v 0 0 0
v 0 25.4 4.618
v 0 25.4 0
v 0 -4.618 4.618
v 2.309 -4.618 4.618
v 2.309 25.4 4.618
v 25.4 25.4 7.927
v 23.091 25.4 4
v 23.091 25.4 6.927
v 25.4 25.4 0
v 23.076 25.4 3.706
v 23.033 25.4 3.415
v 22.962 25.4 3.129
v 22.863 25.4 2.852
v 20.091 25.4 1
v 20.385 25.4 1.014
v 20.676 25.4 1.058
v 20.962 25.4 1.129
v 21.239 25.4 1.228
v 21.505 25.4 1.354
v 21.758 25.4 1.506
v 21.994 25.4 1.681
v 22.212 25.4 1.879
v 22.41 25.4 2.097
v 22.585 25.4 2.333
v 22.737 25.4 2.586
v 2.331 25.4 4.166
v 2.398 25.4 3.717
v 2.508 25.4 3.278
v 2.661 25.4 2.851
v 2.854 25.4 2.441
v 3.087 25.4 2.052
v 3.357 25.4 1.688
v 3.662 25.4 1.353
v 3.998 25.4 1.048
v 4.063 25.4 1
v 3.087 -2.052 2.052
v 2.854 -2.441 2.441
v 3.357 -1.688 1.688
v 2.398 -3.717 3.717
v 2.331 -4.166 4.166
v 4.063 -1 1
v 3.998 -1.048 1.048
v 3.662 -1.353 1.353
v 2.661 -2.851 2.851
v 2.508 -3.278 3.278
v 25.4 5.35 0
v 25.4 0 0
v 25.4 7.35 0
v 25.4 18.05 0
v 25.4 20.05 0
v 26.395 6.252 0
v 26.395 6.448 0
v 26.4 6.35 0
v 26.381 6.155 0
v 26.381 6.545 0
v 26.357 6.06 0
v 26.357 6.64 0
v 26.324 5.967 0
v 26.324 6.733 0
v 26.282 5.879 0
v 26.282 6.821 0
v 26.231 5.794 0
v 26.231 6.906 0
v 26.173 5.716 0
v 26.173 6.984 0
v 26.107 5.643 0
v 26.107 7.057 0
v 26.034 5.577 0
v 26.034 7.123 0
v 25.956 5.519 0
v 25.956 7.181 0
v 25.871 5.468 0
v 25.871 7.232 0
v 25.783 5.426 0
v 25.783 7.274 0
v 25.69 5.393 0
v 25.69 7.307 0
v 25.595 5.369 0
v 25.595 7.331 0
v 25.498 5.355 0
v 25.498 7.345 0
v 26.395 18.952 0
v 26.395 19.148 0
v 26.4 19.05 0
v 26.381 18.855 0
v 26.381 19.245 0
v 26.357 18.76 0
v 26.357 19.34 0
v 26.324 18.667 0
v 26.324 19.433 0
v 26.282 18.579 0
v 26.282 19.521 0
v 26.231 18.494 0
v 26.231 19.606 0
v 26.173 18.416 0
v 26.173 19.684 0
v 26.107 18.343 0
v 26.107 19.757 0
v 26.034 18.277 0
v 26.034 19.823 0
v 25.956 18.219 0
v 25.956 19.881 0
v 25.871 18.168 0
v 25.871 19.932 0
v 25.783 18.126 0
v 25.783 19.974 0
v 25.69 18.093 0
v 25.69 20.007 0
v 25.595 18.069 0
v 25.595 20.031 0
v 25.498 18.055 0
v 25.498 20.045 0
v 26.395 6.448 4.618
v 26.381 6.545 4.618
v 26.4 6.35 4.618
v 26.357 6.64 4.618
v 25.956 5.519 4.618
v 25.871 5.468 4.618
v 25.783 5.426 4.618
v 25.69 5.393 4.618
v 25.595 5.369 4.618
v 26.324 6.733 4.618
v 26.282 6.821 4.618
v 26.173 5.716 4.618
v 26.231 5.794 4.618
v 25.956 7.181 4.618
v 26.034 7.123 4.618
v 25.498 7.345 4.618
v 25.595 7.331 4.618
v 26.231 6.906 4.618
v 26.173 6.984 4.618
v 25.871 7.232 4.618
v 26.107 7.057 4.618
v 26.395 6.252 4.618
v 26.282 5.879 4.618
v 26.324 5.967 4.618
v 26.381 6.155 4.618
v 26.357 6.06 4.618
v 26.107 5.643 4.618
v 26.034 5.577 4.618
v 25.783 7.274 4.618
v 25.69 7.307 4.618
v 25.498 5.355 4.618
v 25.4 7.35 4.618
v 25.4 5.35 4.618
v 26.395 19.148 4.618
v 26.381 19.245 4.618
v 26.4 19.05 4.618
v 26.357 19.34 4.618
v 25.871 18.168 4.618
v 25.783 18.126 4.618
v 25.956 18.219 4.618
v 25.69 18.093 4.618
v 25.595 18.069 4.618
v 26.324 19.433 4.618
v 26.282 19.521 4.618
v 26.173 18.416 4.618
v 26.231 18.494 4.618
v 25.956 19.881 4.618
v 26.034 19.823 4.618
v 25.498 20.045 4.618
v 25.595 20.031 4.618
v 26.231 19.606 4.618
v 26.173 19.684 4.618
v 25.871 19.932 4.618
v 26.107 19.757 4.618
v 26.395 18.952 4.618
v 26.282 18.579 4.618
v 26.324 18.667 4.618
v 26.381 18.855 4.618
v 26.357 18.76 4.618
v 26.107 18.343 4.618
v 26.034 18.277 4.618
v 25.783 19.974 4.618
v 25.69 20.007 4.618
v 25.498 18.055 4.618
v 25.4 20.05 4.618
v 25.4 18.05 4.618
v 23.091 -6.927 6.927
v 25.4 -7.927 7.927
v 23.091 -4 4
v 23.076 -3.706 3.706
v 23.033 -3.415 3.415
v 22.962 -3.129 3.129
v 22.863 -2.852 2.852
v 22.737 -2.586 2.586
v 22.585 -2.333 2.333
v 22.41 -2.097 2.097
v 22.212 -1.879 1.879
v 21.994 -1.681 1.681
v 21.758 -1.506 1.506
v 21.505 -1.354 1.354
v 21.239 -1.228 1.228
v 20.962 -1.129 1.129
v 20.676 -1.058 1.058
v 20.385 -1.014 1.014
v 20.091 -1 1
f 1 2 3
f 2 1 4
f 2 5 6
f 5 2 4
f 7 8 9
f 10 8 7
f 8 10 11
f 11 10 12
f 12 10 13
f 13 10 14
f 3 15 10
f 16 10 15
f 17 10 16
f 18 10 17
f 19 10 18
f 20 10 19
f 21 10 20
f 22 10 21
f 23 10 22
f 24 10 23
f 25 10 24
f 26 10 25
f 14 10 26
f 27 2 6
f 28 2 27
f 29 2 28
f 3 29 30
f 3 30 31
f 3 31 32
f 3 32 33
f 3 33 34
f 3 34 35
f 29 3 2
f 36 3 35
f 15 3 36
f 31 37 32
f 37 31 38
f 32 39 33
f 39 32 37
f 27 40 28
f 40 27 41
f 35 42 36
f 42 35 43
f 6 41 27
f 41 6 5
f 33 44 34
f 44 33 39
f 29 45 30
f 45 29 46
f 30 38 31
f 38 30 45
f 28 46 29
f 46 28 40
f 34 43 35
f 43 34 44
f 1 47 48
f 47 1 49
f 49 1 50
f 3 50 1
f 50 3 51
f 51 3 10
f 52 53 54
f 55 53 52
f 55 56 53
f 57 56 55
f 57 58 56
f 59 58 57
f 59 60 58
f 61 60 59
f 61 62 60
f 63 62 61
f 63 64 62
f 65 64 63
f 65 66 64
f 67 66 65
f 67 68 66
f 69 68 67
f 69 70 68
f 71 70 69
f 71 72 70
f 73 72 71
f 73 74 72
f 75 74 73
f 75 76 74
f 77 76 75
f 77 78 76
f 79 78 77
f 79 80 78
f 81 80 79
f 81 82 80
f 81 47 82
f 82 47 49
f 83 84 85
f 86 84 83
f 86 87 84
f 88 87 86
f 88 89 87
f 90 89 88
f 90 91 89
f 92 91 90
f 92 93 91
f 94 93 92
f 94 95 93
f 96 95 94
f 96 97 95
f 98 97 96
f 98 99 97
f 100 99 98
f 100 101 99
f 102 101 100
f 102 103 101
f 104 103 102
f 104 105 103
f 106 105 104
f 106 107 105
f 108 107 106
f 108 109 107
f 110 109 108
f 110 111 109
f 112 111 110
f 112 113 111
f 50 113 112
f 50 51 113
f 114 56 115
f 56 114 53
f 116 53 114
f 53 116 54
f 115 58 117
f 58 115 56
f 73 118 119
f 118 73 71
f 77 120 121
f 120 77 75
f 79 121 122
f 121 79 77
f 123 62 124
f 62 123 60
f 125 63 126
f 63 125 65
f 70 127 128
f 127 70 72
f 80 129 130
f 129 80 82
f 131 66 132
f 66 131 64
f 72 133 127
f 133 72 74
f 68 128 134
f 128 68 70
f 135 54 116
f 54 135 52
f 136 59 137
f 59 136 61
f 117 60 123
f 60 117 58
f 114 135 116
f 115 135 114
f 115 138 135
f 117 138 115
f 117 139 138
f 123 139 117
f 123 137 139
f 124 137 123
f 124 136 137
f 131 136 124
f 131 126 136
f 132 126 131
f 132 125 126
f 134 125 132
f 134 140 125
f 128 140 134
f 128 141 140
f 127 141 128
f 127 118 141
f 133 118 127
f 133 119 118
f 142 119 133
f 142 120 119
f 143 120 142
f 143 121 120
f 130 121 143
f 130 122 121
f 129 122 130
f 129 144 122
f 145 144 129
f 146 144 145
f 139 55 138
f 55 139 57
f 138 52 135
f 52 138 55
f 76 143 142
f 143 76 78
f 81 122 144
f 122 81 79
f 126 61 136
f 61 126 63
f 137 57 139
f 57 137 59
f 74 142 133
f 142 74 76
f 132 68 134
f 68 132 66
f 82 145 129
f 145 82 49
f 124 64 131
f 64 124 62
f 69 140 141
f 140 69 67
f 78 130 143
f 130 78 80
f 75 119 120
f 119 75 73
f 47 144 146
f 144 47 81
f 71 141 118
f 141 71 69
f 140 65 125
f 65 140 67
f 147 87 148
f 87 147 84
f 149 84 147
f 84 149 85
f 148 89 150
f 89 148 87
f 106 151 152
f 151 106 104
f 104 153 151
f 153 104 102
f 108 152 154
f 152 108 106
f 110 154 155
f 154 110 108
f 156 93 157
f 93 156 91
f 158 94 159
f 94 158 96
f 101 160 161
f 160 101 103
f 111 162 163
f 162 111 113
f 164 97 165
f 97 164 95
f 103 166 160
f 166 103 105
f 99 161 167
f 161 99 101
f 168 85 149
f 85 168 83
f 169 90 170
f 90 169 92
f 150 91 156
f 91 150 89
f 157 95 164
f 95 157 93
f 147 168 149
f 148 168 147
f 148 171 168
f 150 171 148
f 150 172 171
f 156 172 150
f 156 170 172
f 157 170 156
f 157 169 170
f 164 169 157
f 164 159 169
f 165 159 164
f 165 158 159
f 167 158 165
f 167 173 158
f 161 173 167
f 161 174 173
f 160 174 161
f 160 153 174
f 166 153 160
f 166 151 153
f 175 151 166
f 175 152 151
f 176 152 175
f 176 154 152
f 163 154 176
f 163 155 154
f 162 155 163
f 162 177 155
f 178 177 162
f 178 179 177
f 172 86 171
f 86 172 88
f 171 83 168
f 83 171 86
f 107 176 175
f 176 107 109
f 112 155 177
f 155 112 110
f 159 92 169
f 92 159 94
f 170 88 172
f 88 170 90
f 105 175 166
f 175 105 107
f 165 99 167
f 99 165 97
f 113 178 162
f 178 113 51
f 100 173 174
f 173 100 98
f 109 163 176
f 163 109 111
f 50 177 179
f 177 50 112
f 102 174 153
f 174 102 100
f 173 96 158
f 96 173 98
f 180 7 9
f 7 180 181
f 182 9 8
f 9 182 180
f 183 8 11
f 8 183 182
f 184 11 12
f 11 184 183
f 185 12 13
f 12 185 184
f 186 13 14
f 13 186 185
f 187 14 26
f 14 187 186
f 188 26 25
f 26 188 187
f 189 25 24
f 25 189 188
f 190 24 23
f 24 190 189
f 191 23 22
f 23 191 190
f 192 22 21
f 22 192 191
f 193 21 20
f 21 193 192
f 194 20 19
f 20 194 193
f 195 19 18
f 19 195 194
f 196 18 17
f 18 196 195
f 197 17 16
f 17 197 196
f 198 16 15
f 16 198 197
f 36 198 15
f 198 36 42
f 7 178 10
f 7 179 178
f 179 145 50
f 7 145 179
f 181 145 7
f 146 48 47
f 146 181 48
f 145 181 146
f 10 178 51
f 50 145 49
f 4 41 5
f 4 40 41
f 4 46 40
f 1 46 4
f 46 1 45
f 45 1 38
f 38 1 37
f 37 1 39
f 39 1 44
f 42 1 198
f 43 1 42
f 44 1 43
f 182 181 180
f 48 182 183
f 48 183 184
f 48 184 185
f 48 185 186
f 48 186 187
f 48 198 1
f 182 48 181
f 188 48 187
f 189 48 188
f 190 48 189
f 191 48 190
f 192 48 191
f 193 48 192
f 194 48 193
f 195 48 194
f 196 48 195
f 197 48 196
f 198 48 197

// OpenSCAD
// file: constants.scad
inchRatio = 25.4;
nozzelThickness = 0.4;
subUnitSide = 6 * inchRatio;


unitHeight = 1 * inchRatio;
// stepHeight = unitHeight / 12;
stepHeight = unitHeight / 11;
stepTred = (2 * unitHeight) / 11;

$fn = $preview ? 32 : 64;


capHeight = 2 * stepHeight;
capWidth = 4 * nozzelThickness;
taperHeight = .75;
taperWidth = stepTred;

default_wall = 2;


// how thick to make the continuous flat surface of the wall
facadeThickness = 1;
capEdgeDepth = stepTred * 1.5;
// main file
include<constants.scad>


// footer factory
// for (a =[1:5]) {
//     translate([10 * a, 0,0]) 
//     footerRun(a);
// }



// test


// testBase();

// translate([0,0,unitHeight]){
// capInnerRadius();

// translate([unitHeight-capWidth,-capWidth,0]) 
// rotate(a = 90) 
// capInterfaceCorner();

// translate([-capWidth,unitHeight-capWidth,0])
// rotate(a = 180)
// mirror([1,0,0])
// capInterfaceCorner();
// }

// translate([unitHeight,0,0]) 



// flatWall(1);
flatWallCorner();
// flatCap(3);

module flatWallCorner() {
    difference() {

    translate([0,-inchRatio,0]) flatWall(2);

    translate([-2,0,0])
    mirror([0,1,0])
    rotate([90,0,90])
    linear_extrude(inchRatio + 4)
        polygon(
            [
                [0,0],
                [10,10],
                [50,10],
                [50,0],
            ]
        );

    }

}

module flatWall(units = 2) {
    flatWallSection(units);
}

module flatWallBisection(units=2) {
    translate([unitHeight/2,units * inchRatio,facadeThickness])
    rotate([90,0,0]) {
    linear_extrude(units*inchRatio) {
        polygon([[0,0],[facadeThickness,0],[facadeThickness/2,-facadeThickness/4]]);
    }
    }
}

// front pitch = stepHeight by 1






module flatCap(units=2) {
    
    difference() {
    translate([0,units * inchRatio,0]){
        rotate([90,0,0]){
            linear_extrude(units * inchRatio) {
                polygon([
                [0,-3],
                [0,capEdgeDepth + 1],
                [stepHeight * 2, ,capEdgeDepth + 3],
                [stepHeight * 2, ,capEdgeDepth + 2],
                [1.5 ,capEdgeDepth],
                [1.5, -2.5],
            ]);
            }
        }
    }

    capAlignmnetArray(units, xOffset=0, zOffset = -0.1) {
        capAlignmentFemale();
    }
}
}
           



// units = number of inches 
module flatWallSection(units=2) {

    translate([0,units * inchRatio,0])
        rotate([90,0,0])
            linear_extrude(units * inchRatio) {
                fillet(3) 
                polygon([
                    [0,0],
                    [0,facadeThickness],
                    [unitHeight - stepHeight,facadeThickness],
                    [unitHeight - stepHeight,capEdgeDepth],
                    [unitHeight, capEdgeDepth + 1],
                    [unitHeight,0]
                ]);

            }

    layFlatFooter(units);

    capAlignmnetArray(units) {
        capAlignmentMale();
    }

}


module capAlignmentMale() {
    cylinder(r = 1, h=stepTred);
}

module capAlignmentFemale() {
    cylinder(r = 1.2, h=stepTred + 0.2);
}


module layFlatFooter(units = 2) {
    translate([0,0,stepTred]) {
        rotate([0,90,0]) {
            footerRun(units);
        }
    }
}



module fillet(r) {
   offset(r = -r) {
     offset(delta = r) {
       children();
     }
   }
}

module capAlignmnetArray(units = 2, xOffset=unitHeight, zOffset = 0) {

    startingOffset = inchRatio * 0.25;
    incrementalOffset = inchRatio * 0.5;
    numberOfBits = units * 2;
    
    for(i = [1 : 1 : numberOfBits]) {
        offset = startingOffset + (i - 1) * incrementalOffset;
        translate([xOffset,offset,zOffset])
        children();
    }

}






















module testBase() {
//    translate([capWidth,capWidth,0]) 
    difference() {
    cube ([2*unitHeight, 2*unitHeight, unitHeight]);
    cylinder(r=unitHeight,h=unitHeight);
    }
}

// footerRun(5);

// footerCorner();
// minimumFootCorner();
// interfaceFooterCorner();
// footerInsideRadius();
// footerInsideRadius(2);




// capRun(2);
// capInnerRadius();
//  capInnerRadius(1,true,true);
// capInnerRadius(1,true,false);

// capInnerRadius(2);
// capInnerRadius(2,true,true);
// capInnerRadius(2,true,false);
// capCorner();
// capInterfaceCorner();

// #cylinder(h = 5 , r=unitHeight);

// translate([stepTred,stepTred,0]) 
//translate([capWidth,-(capWidth+unitHeight),0]) 
// translate([unitHeight,0,0]) 
// %cube (unitHeight);
// %cylinder(r=unitHeight,h=5);

module footerInsideRadius(unitRadius = 1) {

    r = unitRadius * unitHeight;
    inset = r - taperWidth;

    rotate_extrude(angle = 90, convexity = 10) 
    translate([inset,0,0]) 
    // rotate([-90,0,0]) 
    projection(cut=true) 
    rotate([90,0,0]) 
    footerRun();
    
}


module footerRun(units = 1) {

    difference() {
    cube([stepTred, unitHeight * units, stepHeight +  stepTred]);

    translate([0,-0.5, stepHeight + stepTred]) 
    rotate([-90,0,0]) 
        cylinder(unitHeight  * units + 1 , r = stepTred);
    }

}

module minimumFootCorner() {
    footerCorner(2*taperWidth, 2*taperWidth);
}

module interfaceFooterCorner() {
    footerCorner(taperWidth-stepTred, unitHeight);
}

module footerCorner(l = unitHeight, w = unitHeight) {

    modl = l  + stepTred;
    modw = w + stepTred;

    difference() {

    union() { 
        cube([modw, stepTred,  stepHeight +  stepTred]); // x
        cube([stepTred, modl, stepHeight +  stepTred]); // y
    }


    // x
    translate([-0.5, 0,stepHeight + stepTred]) 
    rotate([0,90,0]) 
        cylinder(modw + 1 , r = stepTred);

    // y
    translate([0,-0.5, stepHeight + stepTred]) 
    rotate([-90,0,0]) 
        cylinder(modl + 1 , r = stepTred);
    }
    
  
}


// cap factory

// for (a =[1:5]) {
//     translate([10 * a, 0,0]) 
//    capRun(a);
// }

module capRun(units = 1) {
    translate([0,unitHeight,0])
    rotate([90,0,0]) 
    linear_extrude(unitHeight * units)
    capPoly();
}

module capPoly() {
    polygon(
        [
            [0,0], 
            [0,capHeight],
            [capWidth,capHeight],
            [capWidth, taperHeight],
            [capWidth + taperWidth, 0]
    //,
      //       [capWidth,0],
        //    [capWidth,-capWidth]
    ]);
}

module capIntegrationCut() {

    
    translate([0,0,-capWidth]) {
        linear_extrude(capHeight + 2 * capWidth) {

            polygon([
                [0,0],
                [0, 2 * taperWidth],
                [2 * taperWidth ,2 *taperWidth]
            ]);

        }
    }
}

module capInnerRadius(unitRadius = 1, yInterface=false,xInterface=false) {

    r = unitRadius * unitHeight;
    inset = r - capWidth;

    //     rotate(a = 180) 
    // capIntegrationCut();

    difference() {
        union() {
            rotate_extrude(angle = 90, convexity = 10)
            translate([inset,0,0]) 
            capPoly();
        }

        if (yInterface) {
            translate([0,inset,0]) 
            capIntegrationCut();
        }


        if (xInterface) {
            translate([inset+2*taperWidth,2 * taperWidth,0]) 
            rotate(a = 180) 
            capIntegrationCut();
        }
    }

}


module taperSizedCapCorner() {
    capCorner(taperWidth);
}

// module capInterfaceCorner() {
//     difference() {
//         capCorner(0,unitHeight );
//             rotate(a = -90) 
//         capIntegrationCut();
//     }
// }


module capInterfaceCorner() {
    difference() {
        capCorner(taperWidth, unitHeight);
        translate([capWidth,0,0]) 
            rotate(a = -90) 
            capIntegrationCut();
    }
}

module capCorner (x = unitHeight, y = unitHeight ) {

    // x
    translate([x+capWidth,0,0]) 
    rotate([90,0,-90]) 
    linear_extrude(x + capWidth)
    capPoly();


    // y
    rotate([90,0,0]) 
    linear_extrude(y + capWidth)
    capPoly();


}
